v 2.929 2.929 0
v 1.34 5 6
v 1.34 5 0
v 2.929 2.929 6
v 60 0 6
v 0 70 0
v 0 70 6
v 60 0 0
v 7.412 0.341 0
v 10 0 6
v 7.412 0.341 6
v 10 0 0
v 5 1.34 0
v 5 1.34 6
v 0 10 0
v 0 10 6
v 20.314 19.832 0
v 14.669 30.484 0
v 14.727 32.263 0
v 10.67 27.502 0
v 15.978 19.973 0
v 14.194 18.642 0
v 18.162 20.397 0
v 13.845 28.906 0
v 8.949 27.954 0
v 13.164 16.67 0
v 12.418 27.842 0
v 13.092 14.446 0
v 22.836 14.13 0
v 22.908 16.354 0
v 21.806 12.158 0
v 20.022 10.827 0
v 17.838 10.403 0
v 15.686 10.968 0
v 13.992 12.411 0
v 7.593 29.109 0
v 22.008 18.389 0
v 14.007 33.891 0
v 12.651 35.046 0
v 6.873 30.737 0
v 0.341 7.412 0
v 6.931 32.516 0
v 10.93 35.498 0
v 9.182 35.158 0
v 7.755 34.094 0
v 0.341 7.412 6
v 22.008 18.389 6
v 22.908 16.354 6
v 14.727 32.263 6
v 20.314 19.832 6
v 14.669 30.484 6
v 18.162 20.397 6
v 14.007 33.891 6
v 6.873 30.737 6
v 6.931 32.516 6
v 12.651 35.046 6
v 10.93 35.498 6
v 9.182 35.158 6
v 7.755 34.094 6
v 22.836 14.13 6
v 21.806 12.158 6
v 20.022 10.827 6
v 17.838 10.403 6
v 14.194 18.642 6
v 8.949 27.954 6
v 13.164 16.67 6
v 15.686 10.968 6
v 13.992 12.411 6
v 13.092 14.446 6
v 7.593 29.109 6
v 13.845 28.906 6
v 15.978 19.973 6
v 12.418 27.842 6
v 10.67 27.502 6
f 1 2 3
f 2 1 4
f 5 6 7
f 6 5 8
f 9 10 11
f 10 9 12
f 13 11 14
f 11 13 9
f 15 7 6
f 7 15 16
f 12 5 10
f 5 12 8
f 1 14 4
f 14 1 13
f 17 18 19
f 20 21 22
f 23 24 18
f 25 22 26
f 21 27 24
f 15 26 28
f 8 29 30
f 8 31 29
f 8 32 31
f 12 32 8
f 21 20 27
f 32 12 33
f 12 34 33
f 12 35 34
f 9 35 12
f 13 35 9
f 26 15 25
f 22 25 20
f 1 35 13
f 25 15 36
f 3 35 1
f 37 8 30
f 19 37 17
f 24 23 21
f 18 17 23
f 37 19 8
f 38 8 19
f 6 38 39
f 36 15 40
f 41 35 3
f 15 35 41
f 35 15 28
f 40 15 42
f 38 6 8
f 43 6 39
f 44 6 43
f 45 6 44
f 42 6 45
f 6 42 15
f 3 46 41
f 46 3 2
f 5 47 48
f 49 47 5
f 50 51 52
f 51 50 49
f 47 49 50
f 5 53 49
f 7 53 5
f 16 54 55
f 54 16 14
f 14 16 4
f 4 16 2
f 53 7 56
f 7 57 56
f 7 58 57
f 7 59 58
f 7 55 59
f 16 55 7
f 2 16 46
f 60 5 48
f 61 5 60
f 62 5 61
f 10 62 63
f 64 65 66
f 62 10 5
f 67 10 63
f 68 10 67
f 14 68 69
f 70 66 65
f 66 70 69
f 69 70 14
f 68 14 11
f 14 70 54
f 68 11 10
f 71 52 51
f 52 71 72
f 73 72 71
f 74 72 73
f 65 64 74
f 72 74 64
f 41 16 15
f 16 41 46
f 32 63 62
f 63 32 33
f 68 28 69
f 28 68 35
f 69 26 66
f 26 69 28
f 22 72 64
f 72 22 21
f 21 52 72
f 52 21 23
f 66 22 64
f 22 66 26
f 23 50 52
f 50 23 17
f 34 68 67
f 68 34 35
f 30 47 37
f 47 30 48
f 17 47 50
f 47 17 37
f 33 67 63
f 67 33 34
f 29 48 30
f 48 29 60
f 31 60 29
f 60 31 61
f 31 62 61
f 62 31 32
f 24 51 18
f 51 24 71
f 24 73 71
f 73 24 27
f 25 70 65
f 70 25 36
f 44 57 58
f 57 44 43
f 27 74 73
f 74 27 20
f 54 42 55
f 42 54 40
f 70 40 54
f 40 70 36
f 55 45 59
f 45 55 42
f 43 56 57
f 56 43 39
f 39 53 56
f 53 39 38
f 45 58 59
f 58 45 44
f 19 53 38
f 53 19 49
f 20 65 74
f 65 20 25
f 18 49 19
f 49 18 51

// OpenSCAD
$fn = 32;

// ----------------------------------------------------------------------
// Bracket plate: corner pad 60 x 70, fillet R10
// ----------------------------------------------------------------------

// --- parameters (mm) ---
hole_r = 4;               // bolt hole radius
plate_t = 6;              // plate thickness, Z (extrusion height)
leg_a = 60;               // base leg
leg_b = 70;               // height leg
fillet_r = 10;            // right-angle fillet radius

hole_d1 = 2 * hole_r + 2;
hole_d2 = 2 * hole_r;

profile = [[10, 0], [60, 0], [0, 70], [0, 10], [0.341, 7.412], [1.34, 5], [2.929, 2.929], [5, 1.34], [7.412, 0.341]];  // primary outline, 9 points, counter clockwise
void_1 = [[22.908, 16.354], [22.008, 18.389], [20.314, 19.832], [18.162, 20.397], [15.978, 19.973], [14.194, 18.642], [13.164, 16.67], [13.092, 14.446], [13.992, 12.411], [15.686, 10.968], [17.838, 10.403], [20.022, 10.827], [21.806, 12.158], [22.836, 14.13]];  // mount hole 1, 14 points
void_2 = [[14.727, 32.263], [14.007, 33.891], [12.651, 35.046], [10.93, 35.498], [9.182, 35.158], [7.755, 34.094], [6.931, 32.516], [6.873, 30.737], [7.593, 29.109], [8.949, 27.954], [10.67, 27.502], [12.418, 27.842], [13.845, 28.906], [14.669, 30.484]];  // mount hole 2, 14 points

// --- the one profile operation ---
difference() {
  linear_extrude(height = plate_t) polygon(points = profile);
  translate([0, 0, -1])
    linear_extrude(height = plate_t + 2) polygon(points = void_1);
  translate([0, 0, -1])
    linear_extrude(height = plate_t + 2) polygon(points = void_2);
}
